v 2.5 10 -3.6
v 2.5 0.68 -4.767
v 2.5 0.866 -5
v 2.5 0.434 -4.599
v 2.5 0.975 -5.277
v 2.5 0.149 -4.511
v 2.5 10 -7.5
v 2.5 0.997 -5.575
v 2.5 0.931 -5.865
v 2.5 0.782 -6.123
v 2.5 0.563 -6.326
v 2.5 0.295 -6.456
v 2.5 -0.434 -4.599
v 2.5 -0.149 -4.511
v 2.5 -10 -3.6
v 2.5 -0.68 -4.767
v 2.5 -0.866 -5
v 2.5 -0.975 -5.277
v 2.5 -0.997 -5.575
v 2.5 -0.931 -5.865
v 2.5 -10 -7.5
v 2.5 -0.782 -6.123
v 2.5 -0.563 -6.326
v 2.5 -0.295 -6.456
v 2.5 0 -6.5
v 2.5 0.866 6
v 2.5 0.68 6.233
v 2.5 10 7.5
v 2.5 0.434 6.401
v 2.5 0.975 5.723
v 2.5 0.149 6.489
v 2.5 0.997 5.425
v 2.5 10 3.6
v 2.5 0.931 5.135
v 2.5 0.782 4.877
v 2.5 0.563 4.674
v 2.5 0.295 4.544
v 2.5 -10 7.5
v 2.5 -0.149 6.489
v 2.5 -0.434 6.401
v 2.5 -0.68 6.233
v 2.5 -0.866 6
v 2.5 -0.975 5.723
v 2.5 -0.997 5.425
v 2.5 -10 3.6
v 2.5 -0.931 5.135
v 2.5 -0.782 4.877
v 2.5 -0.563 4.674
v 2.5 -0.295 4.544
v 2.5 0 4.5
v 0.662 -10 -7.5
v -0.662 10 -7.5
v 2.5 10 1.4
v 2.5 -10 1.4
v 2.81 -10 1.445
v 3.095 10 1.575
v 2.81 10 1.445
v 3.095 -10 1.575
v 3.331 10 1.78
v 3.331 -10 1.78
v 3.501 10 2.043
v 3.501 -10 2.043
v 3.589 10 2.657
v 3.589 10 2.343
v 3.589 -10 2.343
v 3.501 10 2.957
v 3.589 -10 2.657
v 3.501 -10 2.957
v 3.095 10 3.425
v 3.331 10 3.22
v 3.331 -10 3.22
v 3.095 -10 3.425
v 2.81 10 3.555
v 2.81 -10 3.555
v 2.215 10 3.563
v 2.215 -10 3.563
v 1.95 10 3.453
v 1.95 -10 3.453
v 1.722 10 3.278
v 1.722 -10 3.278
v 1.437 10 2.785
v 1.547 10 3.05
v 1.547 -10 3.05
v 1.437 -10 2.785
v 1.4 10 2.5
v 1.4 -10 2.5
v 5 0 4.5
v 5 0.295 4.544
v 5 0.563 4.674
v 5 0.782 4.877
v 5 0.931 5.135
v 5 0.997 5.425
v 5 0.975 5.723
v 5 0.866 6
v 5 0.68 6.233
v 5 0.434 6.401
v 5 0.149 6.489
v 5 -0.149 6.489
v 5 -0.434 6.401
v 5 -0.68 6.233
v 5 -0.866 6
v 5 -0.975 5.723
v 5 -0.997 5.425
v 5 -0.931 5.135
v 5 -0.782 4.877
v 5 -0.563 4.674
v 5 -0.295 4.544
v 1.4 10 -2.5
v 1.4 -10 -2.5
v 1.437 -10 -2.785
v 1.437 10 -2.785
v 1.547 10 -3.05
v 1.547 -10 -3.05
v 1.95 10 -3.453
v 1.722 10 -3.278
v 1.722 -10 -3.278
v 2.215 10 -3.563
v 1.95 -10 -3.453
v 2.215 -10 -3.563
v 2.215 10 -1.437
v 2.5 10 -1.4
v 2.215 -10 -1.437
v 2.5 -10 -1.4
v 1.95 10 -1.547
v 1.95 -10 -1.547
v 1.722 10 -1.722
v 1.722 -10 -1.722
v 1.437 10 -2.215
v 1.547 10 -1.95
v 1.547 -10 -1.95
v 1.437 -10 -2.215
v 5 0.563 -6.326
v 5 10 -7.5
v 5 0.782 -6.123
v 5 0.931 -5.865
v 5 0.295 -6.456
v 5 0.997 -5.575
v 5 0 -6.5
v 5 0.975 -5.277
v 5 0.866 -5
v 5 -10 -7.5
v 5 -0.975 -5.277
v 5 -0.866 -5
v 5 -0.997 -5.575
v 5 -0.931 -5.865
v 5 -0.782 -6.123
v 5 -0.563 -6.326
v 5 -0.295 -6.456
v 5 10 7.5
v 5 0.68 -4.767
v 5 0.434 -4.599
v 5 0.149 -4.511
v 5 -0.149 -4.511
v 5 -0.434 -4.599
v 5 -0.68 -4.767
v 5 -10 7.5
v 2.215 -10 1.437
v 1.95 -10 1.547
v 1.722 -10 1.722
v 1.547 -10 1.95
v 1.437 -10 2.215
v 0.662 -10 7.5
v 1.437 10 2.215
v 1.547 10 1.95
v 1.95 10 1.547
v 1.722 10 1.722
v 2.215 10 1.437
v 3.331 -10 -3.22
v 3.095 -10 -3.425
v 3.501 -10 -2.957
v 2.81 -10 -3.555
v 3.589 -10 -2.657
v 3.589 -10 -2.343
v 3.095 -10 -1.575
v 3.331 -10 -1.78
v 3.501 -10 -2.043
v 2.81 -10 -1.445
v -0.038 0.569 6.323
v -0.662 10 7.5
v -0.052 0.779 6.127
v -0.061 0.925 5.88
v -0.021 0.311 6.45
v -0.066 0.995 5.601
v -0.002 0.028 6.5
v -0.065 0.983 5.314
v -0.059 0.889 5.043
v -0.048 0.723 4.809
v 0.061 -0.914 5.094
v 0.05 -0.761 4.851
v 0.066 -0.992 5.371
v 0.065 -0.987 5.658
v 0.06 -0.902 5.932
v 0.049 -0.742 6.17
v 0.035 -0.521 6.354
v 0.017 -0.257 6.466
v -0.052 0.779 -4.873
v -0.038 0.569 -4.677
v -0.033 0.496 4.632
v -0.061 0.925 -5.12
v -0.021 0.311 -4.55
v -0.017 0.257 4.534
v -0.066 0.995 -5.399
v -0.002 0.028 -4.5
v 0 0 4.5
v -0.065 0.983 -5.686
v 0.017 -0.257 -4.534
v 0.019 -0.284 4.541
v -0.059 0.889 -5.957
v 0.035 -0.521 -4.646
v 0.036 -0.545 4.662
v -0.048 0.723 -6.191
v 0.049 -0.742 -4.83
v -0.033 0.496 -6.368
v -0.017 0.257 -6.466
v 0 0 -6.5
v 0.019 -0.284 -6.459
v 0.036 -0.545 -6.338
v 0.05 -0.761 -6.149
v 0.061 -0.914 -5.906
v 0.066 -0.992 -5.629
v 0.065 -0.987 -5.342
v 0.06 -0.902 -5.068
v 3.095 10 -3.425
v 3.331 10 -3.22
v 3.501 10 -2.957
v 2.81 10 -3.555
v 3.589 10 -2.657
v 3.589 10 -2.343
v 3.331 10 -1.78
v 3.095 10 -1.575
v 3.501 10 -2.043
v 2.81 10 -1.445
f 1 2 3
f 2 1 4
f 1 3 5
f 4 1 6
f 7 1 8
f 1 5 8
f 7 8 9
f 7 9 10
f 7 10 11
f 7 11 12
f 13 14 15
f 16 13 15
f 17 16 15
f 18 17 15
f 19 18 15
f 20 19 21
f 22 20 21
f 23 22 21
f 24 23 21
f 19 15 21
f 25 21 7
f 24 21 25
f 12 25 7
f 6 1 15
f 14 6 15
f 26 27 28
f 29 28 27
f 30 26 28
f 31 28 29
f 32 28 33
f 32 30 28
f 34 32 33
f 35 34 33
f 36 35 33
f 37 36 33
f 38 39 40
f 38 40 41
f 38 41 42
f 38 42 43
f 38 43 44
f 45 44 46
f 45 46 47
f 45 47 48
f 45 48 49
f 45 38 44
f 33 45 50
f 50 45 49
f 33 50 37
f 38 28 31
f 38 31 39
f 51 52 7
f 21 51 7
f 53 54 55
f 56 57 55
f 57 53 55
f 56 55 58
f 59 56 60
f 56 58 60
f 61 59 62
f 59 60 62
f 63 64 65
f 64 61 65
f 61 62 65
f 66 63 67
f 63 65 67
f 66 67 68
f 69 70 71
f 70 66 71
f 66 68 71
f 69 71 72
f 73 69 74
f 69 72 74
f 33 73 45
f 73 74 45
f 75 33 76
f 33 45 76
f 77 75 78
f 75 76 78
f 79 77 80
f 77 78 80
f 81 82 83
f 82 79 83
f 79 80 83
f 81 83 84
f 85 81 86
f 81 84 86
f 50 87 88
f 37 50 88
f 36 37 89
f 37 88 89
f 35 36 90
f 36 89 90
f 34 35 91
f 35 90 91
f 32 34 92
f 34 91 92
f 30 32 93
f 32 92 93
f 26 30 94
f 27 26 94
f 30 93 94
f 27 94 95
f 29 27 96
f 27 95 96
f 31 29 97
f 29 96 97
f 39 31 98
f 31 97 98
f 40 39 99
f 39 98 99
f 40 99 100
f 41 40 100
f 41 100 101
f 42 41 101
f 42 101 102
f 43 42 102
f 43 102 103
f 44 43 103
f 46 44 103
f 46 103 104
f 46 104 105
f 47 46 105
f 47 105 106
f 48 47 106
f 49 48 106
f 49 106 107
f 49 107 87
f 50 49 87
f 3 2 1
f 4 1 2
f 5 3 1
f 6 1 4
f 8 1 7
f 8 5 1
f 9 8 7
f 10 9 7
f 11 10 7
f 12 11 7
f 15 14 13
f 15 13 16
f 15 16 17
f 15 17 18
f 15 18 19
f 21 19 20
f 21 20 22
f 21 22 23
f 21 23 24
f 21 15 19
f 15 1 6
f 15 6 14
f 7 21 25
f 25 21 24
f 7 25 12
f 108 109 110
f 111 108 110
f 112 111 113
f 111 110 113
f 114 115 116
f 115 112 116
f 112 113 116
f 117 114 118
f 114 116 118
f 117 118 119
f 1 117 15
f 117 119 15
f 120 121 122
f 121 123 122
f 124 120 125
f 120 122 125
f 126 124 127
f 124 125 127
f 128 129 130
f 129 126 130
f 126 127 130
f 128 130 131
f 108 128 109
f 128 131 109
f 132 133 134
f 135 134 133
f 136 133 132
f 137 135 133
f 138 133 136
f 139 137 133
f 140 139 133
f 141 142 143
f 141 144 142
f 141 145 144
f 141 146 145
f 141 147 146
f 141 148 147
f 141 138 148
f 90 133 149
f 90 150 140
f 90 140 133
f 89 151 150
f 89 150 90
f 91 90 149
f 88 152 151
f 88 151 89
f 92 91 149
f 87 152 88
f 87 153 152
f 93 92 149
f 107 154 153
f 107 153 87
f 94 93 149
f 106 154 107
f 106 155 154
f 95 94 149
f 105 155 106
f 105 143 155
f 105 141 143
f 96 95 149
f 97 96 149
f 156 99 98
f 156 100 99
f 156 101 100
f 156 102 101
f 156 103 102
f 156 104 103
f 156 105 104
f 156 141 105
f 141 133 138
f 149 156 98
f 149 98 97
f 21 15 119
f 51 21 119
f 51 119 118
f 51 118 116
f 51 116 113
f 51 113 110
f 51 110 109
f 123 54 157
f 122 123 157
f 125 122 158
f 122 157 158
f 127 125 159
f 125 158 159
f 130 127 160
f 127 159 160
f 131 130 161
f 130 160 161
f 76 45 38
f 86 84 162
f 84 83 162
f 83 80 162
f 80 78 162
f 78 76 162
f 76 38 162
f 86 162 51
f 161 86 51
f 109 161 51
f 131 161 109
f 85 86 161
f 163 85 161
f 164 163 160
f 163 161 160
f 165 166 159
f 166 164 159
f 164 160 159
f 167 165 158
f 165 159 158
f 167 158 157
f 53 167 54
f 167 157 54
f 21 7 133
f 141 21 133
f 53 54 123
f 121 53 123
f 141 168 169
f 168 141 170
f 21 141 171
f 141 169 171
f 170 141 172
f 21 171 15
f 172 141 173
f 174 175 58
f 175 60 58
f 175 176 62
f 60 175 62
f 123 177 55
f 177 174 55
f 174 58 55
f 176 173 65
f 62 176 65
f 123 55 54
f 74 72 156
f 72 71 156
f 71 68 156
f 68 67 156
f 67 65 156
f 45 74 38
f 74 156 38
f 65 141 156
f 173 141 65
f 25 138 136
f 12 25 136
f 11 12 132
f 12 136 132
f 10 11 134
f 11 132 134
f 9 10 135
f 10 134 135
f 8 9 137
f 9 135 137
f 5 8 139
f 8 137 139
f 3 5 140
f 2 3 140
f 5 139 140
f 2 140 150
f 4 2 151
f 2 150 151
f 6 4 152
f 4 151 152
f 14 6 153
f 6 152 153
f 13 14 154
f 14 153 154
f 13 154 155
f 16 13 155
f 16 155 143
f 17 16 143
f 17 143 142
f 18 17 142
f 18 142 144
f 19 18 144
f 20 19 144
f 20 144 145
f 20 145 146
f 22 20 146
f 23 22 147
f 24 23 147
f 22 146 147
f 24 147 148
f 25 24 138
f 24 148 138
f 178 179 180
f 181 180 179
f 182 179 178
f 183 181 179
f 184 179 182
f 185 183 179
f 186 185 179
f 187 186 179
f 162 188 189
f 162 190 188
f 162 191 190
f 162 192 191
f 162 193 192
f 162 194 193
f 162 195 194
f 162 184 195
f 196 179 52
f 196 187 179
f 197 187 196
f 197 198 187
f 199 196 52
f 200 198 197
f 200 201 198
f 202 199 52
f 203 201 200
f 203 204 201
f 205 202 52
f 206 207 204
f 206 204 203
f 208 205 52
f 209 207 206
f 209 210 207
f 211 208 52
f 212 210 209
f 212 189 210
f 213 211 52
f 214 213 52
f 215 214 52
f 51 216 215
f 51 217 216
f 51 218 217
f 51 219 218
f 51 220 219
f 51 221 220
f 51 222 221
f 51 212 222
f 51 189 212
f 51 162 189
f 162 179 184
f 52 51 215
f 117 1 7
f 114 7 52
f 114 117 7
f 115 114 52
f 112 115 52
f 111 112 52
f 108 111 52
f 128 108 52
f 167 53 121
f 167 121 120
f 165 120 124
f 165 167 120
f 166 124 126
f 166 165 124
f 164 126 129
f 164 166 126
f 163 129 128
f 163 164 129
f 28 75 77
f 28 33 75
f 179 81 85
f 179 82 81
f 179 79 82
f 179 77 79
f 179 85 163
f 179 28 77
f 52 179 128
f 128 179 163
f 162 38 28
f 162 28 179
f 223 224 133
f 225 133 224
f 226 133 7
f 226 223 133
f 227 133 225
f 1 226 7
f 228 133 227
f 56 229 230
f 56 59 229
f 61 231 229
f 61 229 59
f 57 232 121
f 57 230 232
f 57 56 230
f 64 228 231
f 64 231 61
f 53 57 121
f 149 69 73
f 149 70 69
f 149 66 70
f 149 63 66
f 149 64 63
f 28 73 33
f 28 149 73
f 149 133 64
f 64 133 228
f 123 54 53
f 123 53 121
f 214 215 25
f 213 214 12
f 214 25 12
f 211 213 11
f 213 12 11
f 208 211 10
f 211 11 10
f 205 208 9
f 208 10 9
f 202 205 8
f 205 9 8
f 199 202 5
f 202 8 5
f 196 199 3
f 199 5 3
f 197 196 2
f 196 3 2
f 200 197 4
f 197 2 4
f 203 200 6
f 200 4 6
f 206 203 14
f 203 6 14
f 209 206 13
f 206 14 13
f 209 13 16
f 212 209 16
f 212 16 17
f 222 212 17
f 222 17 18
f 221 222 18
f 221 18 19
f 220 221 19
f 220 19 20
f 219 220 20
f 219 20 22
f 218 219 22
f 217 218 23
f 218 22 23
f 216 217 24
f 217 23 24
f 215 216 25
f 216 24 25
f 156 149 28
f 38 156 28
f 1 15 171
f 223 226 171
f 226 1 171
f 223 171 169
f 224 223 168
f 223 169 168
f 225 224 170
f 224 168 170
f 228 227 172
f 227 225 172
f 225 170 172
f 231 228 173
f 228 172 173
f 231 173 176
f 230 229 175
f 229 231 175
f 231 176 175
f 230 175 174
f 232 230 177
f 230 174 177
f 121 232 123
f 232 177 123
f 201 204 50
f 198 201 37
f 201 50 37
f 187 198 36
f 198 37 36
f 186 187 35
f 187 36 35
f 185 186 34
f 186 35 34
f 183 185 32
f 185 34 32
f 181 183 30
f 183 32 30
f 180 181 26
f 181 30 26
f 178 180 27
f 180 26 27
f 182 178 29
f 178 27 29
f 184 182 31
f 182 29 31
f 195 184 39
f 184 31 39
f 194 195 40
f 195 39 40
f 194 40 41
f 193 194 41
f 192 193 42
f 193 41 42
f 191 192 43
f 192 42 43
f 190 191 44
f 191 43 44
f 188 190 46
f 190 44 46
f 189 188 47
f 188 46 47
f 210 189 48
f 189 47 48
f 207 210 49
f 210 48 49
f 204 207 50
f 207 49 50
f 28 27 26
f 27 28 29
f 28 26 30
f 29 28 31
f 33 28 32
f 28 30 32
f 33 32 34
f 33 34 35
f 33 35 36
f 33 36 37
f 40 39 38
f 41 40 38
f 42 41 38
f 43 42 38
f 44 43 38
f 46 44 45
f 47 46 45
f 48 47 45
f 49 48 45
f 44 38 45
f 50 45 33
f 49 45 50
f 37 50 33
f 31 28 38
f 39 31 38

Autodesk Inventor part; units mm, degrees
ref_plane "XZ Plane" through (0, 0, 0) normal (0, 1, 0) x (-1, 0, 0)
ref_plane "XY Plane" through (0, 0, 0) normal (0, 0, 1) x (1, 0, 0)
sketch "Sketch1" plane through (0, 0, 0) normal (0, 1, 0) x (-1, 0, 0)
  line L0 (-5, 7.5) -> (5, 7.5)
  line L1 (5, 7.5) -> (5, -7.5)
  line L2 (5, -7.5) -> (-5, -7.5)
  line L3 (-5, -7.5) -> (-5, 7.5)
  line L4 (-5, 7.5) -> (5, -7.5) construction
  line L5 (5, 7.5) -> (-5, -7.5) construction
  line L6 (-2.5, 2.5) -> (2.5, 2.5) construction
  line L7 (2.5, 2.5) -> (2.5, -2.5) construction
  line L8 (2.5, -2.5) -> (-2.5, -2.5) construction
  line L9 (-2.5, -2.5) -> (-2.5, 2.5) construction
  line L10 (-2.5, 2.5) -> (2.5, -2.5) construction
  line L11 (2.5, 2.5) -> (-2.5, -2.5) construction
  circle A0 centre (2.5, -2.5) radius 1.1
  circle A1 centre (2.5, 2.5) radius 1.1
  circle A2 centre (-2.5, -2.5) radius 1.1
  circle A3 centre (-2.5, 2.5) radius 1.1
  point P0 (0, 0)
  dimension "d6" = 2.2
  dimension "d7" = 2.2
  dimension "d8" = 2.2
  dimension "d9" = 2.2
  dimension "d10" = 10
  dimension "d11" = 15
  dimension "d12" = 5
  dimension "d13" = 5
extrude "Extrusion3" add sketch "Sketch1" along normal mid plane 20
ref_plane "Work Plane2" through (2.5, 10, -2.5) normal (-1, 0, 0) x (0, -1, 0)
ref_plane "Work Plane4" through (0, 0, 0) normal (0.997813, 0.0660998, 0) x (0, 0, 1)
split "Split2" plane through (0, 0, 0) removes the side toward (-0.997813, -0.0660998, 0)
ref_plane "Work Plane5" through (5, -10, -7.5) normal (1, 0, 0) x (0, 0, -1)
sketch "Sketch3" plane through (5, -10, -7.5) normal (1, 0, 0) x (0, 0, -1)
  line L0 (-2, 10) -> (-13, 10) construction
  circle A0 centre (-13, 10) radius 1
  circle A1 centre (-2, 10) radius 1
  point P0 (-7.5, 10)
  dimension "d21" = 5.5
  dimension "d22" = 5.5
  dimension "d23" = 2
  dimension "d24" = 2
extrude "Extrusion4" cut sketch "Sketch3" against normal through all
split body "Split5" result two bodies by plane through (2.5, 10, -2.5) normal (-1, 0, 0) first body at (0.9582, -6.9004, 1.6335)
thread "Thread1" size "M2x0.4" class "6H" standard "ANSI Metric M Profile" full length
thread "Thread2" size "M2x0.4" class "6H" standard "ANSI Metric M Profile" full length
equation "\"d7\" = d6"
equation "\"d8\" = d7"
equation "\"d9\" = d6"
equation "\"d22\" = d21"
equation "\"d24\" = d23"
properties part number "loop holder"
